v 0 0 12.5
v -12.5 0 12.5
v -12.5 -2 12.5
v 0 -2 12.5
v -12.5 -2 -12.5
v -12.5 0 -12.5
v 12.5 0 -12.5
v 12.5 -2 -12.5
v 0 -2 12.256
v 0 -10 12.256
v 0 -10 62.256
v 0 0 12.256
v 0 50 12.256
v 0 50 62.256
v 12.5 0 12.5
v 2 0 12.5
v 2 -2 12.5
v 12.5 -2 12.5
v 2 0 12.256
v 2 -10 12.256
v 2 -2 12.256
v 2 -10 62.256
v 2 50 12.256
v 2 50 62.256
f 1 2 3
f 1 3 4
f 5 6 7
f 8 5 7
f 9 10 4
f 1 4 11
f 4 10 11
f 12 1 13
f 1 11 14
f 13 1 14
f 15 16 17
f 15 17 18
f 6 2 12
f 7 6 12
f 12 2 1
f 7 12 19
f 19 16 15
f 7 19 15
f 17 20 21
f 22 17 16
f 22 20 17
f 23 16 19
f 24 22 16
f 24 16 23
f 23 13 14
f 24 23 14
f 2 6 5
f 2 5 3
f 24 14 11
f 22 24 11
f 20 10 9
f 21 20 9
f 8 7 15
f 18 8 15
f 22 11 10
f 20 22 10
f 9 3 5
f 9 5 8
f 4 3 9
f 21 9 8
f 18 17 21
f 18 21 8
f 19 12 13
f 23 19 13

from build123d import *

# Parameters (mm, degrees)
F0_W     = 25
F0_H     = 25
F1_DEPTH = 2
F3_DEPTH = 2


with BuildPart() as f1:
    # F0 (on Front) → F1 (new body)
    with BuildSketch(Plane.XZ):
        Rectangle(F0_W, F0_H)
    extrude(amount=F1_DEPTH)

    # F2 (on Right) → F3 (join)
    with BuildSketch(Plane.YZ):
        Polygon((-10, 12.2555047274), (0, 12.2555047274), (50, 12.2555047274), (50, 62.2555047274), (-10, 62.2555047274), align=None)
    extrude(amount=F3_DEPTH)


solid = f1.part
